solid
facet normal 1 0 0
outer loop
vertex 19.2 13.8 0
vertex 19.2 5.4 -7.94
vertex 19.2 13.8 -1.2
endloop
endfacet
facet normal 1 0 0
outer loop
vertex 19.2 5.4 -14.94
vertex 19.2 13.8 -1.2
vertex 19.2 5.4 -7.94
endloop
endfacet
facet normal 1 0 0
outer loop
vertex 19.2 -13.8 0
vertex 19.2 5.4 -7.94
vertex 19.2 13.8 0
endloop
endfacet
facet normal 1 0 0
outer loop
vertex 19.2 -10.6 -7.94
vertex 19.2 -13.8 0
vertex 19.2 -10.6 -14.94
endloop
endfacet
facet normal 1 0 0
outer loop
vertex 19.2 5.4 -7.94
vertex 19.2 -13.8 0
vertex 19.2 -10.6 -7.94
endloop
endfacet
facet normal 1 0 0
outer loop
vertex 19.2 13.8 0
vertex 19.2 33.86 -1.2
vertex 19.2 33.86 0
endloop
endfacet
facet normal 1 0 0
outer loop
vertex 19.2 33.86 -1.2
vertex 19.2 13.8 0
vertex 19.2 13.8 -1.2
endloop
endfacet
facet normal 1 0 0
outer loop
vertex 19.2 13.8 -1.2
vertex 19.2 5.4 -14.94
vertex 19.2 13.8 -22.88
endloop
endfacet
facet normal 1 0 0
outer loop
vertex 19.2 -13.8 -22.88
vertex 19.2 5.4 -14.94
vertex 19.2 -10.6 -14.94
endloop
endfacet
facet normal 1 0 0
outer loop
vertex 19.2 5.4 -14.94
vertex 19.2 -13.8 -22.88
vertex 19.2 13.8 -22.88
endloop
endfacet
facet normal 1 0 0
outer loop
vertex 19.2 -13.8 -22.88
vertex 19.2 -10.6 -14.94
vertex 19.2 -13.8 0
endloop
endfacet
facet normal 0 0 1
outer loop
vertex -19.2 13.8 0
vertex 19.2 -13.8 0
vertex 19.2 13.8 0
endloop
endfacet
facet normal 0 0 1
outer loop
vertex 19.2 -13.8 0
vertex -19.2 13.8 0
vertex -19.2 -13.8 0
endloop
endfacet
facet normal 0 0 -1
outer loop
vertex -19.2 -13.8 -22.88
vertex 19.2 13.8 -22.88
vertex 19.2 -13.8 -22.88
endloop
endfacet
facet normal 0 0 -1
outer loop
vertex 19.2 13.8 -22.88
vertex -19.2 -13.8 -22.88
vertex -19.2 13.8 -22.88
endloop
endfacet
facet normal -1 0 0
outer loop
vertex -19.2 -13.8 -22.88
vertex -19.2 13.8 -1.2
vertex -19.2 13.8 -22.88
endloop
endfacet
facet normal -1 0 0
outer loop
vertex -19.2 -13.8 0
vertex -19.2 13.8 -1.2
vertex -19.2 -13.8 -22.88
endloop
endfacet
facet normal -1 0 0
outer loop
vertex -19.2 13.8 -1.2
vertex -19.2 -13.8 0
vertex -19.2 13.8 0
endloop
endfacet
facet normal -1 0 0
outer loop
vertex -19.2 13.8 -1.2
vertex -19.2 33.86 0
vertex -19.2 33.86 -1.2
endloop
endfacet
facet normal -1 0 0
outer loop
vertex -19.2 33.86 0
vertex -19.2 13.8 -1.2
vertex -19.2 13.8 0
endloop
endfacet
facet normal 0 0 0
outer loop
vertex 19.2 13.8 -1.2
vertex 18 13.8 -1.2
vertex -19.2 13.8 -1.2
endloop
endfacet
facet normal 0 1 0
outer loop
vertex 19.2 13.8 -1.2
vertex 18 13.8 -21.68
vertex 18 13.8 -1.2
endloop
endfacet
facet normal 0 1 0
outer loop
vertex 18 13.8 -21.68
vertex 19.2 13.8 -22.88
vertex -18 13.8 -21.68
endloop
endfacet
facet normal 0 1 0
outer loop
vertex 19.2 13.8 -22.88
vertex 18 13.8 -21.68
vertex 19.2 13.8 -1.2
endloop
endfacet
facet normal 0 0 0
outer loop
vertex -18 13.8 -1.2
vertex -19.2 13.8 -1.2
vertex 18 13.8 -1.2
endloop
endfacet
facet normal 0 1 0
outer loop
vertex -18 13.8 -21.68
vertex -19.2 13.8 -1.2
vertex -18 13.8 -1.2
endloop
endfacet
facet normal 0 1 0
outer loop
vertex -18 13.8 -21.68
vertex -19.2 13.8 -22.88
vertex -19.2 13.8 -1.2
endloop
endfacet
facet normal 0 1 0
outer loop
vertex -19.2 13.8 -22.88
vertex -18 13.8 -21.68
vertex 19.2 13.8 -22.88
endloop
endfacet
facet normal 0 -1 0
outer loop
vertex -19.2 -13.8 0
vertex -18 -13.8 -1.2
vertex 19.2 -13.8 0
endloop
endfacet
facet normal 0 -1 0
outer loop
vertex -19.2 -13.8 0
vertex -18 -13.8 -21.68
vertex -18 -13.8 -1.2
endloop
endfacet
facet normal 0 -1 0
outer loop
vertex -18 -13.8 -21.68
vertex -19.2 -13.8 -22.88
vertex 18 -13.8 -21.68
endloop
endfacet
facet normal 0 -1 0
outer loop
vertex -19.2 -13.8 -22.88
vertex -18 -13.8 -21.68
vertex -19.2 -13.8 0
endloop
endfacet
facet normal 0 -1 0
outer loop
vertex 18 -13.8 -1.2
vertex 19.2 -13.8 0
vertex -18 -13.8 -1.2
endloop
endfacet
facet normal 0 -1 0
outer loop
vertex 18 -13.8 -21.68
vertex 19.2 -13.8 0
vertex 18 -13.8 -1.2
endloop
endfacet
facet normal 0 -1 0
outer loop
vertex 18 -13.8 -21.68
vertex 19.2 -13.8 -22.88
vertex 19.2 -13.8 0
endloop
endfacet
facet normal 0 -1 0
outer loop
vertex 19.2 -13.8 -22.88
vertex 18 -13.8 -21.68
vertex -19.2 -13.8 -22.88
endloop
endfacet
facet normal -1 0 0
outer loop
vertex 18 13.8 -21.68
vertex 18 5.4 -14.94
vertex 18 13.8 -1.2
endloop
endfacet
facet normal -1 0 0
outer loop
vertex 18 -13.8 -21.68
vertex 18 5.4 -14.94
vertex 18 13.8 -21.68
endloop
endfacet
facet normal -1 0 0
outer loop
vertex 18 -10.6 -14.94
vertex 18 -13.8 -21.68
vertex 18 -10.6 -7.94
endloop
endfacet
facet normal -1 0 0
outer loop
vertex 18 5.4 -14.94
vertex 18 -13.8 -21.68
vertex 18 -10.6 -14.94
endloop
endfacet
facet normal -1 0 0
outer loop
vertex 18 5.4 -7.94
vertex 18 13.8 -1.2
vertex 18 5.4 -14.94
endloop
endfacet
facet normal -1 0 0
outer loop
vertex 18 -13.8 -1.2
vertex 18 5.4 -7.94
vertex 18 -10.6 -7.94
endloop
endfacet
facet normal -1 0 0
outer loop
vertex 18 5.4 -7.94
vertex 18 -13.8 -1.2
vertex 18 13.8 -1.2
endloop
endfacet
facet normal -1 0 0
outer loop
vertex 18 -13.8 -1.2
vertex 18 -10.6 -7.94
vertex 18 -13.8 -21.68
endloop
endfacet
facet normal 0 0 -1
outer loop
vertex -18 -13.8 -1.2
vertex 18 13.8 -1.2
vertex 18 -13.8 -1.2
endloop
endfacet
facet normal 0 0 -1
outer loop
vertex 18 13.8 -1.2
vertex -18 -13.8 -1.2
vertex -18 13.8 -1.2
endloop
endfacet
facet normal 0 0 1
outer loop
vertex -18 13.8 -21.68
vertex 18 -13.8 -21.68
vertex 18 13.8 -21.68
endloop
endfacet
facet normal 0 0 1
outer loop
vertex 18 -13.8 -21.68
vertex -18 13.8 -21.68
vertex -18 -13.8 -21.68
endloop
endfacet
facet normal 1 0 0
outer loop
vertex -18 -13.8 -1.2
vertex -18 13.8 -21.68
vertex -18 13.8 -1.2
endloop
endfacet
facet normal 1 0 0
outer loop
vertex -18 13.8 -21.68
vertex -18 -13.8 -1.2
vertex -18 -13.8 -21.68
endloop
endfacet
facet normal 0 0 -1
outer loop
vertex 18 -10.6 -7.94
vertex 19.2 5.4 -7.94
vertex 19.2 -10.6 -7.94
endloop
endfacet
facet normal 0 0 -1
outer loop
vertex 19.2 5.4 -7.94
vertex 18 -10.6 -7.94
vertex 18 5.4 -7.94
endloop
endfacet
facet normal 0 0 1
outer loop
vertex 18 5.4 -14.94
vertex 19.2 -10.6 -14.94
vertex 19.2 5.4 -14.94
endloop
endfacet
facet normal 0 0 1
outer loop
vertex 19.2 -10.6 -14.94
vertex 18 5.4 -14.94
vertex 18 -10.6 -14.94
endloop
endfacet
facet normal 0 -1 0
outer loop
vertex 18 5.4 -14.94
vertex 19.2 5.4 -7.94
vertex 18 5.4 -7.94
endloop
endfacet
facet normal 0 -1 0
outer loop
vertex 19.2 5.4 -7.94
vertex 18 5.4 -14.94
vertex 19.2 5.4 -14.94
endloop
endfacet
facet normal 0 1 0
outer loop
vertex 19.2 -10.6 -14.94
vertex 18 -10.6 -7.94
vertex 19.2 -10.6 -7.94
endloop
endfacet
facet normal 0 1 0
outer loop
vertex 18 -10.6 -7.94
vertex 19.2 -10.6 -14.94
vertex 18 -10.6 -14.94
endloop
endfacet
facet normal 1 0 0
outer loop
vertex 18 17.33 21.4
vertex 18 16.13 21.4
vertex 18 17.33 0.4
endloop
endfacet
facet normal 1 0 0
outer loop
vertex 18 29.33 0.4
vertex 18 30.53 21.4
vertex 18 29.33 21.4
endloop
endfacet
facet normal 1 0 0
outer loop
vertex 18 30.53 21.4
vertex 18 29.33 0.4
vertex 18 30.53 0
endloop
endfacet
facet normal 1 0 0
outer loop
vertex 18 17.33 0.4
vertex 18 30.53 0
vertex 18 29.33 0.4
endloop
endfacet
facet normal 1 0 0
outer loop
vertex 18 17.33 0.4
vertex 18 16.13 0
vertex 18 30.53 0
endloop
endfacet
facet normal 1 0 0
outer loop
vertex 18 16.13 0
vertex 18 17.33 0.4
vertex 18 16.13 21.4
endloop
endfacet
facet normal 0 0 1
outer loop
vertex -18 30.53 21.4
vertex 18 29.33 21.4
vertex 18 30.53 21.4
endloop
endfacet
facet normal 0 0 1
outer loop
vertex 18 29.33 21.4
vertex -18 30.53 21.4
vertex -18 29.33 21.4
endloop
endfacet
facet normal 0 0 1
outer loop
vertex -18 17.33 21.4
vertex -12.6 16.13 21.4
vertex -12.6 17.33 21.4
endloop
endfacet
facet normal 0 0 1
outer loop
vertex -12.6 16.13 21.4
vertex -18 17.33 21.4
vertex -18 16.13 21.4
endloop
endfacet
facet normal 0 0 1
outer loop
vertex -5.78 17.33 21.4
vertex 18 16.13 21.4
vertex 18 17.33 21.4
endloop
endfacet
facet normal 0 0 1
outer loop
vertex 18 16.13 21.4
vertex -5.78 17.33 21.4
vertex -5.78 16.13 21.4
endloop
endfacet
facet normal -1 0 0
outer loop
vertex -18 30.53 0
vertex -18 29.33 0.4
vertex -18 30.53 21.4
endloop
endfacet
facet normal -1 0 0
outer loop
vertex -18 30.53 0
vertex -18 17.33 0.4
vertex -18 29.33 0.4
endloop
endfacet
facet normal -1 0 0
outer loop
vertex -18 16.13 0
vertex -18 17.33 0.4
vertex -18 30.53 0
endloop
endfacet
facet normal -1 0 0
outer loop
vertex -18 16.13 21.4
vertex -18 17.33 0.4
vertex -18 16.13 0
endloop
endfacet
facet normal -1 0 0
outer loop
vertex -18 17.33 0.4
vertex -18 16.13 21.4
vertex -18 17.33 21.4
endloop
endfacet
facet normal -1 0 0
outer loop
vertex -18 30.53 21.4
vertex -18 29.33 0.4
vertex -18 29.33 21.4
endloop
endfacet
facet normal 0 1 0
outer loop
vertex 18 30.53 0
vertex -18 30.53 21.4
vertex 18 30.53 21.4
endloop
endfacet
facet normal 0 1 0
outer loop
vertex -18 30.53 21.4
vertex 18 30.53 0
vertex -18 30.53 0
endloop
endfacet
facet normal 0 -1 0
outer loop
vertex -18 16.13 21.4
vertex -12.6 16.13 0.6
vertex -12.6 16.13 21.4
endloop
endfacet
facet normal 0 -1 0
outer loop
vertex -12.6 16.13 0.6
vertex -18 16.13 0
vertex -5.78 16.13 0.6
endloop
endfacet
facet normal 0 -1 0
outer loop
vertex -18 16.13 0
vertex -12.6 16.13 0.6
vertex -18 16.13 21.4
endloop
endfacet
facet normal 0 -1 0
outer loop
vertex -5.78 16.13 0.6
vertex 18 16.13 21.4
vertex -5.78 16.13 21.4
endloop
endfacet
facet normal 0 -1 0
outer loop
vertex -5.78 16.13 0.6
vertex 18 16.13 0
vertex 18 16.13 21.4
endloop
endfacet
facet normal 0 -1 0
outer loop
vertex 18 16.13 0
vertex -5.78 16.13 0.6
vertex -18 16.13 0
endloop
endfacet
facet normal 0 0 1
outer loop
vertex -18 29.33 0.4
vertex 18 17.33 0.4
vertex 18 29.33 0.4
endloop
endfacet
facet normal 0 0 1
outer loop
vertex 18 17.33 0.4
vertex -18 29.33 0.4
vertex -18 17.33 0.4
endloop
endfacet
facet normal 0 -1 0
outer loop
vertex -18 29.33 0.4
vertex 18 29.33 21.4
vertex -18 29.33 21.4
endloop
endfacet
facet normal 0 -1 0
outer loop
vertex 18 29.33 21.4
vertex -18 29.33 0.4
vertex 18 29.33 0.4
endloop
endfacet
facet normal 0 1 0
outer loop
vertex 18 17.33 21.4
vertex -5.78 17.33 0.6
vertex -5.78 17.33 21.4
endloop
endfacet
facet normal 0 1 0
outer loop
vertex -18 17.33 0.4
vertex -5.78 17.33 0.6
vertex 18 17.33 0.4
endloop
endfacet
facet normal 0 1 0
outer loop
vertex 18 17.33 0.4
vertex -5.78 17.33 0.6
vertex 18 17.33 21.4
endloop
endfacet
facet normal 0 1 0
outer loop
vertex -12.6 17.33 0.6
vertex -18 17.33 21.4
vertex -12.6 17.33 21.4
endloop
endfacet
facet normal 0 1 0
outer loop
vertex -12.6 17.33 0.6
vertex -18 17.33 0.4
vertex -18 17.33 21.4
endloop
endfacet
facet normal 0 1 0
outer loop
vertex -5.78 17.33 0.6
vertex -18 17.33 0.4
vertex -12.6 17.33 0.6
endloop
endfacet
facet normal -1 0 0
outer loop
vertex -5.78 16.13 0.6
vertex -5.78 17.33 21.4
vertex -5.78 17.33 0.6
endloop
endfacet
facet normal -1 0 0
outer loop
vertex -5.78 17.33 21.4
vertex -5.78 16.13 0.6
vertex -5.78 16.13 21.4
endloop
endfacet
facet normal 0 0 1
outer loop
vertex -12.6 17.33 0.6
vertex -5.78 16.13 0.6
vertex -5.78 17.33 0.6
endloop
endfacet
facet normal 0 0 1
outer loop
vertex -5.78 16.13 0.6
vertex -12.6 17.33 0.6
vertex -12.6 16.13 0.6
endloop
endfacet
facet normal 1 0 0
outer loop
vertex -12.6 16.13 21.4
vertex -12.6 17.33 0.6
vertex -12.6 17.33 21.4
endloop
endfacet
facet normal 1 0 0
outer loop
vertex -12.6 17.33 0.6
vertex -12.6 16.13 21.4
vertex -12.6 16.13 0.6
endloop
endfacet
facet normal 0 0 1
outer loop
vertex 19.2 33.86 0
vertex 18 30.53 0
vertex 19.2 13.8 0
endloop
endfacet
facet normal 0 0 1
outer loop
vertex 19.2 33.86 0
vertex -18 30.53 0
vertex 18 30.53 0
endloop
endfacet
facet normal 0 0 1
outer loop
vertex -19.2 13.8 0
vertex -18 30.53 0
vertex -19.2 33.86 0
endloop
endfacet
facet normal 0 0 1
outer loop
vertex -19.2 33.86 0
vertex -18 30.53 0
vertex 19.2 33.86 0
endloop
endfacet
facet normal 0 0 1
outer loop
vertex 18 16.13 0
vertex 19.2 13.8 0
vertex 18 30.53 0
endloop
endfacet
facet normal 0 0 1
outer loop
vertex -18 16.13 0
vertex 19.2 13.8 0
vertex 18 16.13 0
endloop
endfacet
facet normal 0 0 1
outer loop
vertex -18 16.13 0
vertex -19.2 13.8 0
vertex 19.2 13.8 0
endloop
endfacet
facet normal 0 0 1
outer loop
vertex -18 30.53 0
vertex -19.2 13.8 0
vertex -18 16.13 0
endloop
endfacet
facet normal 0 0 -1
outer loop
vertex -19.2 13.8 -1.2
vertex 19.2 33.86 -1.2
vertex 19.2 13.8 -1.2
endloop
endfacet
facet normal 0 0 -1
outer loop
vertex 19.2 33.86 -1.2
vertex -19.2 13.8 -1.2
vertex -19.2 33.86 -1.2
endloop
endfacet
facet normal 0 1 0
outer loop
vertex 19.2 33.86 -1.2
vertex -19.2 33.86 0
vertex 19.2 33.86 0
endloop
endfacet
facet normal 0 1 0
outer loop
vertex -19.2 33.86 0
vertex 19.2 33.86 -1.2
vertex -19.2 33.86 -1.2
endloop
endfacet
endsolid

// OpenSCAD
// support pour charger la montre

// thickness of the thing 
thickness=1.2;

/* [charger "box"] */
chargerX=36;
chargerY=27.6;
chargerZ=20.48;
chargerTotalY=48.66;

chargerUSBslotY=16;
chargerUSBslotZ=7;

/* [watch U Box] */

watchX=36;
watchY=12;
watchZ=22;

watchUSBholeX=6.82;
watchUSBdistX=5.4;

/* [hidden] */
chargerUSBslotX=thickness + 2;
plateY=chargerTotalY - chargerY;
watchUSBholeZ=watchZ;

base();

module base()
{
	translate([0,0,-((chargerZ + thickness * 2) /2)]) doChargerBox();
	doWatchBraket();
}


module doWatchBraket()
{
	translate([0,(plateY / 2) + (chargerY / 2) -1, -thickness / 2]) 
	union()
	{
		// plate
		cube([chargerX + thickness * 2, plateY, thickness], center=true);
	
		// ubox
		translate([0,0,watchZ / 2]) difference()
		{
			cube([watchX, watchY + thickness * 2, watchZ], center=true);
			translate([0,0,2]) cube([watchX + 2, watchY, watchZ + 2], center=true);
			// hole for usb in the ubox
			translate([-((watchUSBholeX / 2) + ((watchX / 2) - watchUSBholeX) - watchUSBdistX) ,-((watchY / 2) + 1),thickness]) 
				cube([watchUSBholeX, thickness + 2, watchUSBholeZ], center=true);
		}
	}
	
}

module doChargerBox()
{
	difference()
	{
		cube([chargerX + thickness * 2, chargerY, chargerZ + thickness * 2], center=true);
		cube([chargerX, chargerY + 2, chargerZ], center=true);
		
		// hole for usb slot
		translate([((chargerX+thickness) / 2),-2.6,0]) cube([thickness + 2, chargerUSBslotY, chargerUSBslotZ], center=true);
	}
}
